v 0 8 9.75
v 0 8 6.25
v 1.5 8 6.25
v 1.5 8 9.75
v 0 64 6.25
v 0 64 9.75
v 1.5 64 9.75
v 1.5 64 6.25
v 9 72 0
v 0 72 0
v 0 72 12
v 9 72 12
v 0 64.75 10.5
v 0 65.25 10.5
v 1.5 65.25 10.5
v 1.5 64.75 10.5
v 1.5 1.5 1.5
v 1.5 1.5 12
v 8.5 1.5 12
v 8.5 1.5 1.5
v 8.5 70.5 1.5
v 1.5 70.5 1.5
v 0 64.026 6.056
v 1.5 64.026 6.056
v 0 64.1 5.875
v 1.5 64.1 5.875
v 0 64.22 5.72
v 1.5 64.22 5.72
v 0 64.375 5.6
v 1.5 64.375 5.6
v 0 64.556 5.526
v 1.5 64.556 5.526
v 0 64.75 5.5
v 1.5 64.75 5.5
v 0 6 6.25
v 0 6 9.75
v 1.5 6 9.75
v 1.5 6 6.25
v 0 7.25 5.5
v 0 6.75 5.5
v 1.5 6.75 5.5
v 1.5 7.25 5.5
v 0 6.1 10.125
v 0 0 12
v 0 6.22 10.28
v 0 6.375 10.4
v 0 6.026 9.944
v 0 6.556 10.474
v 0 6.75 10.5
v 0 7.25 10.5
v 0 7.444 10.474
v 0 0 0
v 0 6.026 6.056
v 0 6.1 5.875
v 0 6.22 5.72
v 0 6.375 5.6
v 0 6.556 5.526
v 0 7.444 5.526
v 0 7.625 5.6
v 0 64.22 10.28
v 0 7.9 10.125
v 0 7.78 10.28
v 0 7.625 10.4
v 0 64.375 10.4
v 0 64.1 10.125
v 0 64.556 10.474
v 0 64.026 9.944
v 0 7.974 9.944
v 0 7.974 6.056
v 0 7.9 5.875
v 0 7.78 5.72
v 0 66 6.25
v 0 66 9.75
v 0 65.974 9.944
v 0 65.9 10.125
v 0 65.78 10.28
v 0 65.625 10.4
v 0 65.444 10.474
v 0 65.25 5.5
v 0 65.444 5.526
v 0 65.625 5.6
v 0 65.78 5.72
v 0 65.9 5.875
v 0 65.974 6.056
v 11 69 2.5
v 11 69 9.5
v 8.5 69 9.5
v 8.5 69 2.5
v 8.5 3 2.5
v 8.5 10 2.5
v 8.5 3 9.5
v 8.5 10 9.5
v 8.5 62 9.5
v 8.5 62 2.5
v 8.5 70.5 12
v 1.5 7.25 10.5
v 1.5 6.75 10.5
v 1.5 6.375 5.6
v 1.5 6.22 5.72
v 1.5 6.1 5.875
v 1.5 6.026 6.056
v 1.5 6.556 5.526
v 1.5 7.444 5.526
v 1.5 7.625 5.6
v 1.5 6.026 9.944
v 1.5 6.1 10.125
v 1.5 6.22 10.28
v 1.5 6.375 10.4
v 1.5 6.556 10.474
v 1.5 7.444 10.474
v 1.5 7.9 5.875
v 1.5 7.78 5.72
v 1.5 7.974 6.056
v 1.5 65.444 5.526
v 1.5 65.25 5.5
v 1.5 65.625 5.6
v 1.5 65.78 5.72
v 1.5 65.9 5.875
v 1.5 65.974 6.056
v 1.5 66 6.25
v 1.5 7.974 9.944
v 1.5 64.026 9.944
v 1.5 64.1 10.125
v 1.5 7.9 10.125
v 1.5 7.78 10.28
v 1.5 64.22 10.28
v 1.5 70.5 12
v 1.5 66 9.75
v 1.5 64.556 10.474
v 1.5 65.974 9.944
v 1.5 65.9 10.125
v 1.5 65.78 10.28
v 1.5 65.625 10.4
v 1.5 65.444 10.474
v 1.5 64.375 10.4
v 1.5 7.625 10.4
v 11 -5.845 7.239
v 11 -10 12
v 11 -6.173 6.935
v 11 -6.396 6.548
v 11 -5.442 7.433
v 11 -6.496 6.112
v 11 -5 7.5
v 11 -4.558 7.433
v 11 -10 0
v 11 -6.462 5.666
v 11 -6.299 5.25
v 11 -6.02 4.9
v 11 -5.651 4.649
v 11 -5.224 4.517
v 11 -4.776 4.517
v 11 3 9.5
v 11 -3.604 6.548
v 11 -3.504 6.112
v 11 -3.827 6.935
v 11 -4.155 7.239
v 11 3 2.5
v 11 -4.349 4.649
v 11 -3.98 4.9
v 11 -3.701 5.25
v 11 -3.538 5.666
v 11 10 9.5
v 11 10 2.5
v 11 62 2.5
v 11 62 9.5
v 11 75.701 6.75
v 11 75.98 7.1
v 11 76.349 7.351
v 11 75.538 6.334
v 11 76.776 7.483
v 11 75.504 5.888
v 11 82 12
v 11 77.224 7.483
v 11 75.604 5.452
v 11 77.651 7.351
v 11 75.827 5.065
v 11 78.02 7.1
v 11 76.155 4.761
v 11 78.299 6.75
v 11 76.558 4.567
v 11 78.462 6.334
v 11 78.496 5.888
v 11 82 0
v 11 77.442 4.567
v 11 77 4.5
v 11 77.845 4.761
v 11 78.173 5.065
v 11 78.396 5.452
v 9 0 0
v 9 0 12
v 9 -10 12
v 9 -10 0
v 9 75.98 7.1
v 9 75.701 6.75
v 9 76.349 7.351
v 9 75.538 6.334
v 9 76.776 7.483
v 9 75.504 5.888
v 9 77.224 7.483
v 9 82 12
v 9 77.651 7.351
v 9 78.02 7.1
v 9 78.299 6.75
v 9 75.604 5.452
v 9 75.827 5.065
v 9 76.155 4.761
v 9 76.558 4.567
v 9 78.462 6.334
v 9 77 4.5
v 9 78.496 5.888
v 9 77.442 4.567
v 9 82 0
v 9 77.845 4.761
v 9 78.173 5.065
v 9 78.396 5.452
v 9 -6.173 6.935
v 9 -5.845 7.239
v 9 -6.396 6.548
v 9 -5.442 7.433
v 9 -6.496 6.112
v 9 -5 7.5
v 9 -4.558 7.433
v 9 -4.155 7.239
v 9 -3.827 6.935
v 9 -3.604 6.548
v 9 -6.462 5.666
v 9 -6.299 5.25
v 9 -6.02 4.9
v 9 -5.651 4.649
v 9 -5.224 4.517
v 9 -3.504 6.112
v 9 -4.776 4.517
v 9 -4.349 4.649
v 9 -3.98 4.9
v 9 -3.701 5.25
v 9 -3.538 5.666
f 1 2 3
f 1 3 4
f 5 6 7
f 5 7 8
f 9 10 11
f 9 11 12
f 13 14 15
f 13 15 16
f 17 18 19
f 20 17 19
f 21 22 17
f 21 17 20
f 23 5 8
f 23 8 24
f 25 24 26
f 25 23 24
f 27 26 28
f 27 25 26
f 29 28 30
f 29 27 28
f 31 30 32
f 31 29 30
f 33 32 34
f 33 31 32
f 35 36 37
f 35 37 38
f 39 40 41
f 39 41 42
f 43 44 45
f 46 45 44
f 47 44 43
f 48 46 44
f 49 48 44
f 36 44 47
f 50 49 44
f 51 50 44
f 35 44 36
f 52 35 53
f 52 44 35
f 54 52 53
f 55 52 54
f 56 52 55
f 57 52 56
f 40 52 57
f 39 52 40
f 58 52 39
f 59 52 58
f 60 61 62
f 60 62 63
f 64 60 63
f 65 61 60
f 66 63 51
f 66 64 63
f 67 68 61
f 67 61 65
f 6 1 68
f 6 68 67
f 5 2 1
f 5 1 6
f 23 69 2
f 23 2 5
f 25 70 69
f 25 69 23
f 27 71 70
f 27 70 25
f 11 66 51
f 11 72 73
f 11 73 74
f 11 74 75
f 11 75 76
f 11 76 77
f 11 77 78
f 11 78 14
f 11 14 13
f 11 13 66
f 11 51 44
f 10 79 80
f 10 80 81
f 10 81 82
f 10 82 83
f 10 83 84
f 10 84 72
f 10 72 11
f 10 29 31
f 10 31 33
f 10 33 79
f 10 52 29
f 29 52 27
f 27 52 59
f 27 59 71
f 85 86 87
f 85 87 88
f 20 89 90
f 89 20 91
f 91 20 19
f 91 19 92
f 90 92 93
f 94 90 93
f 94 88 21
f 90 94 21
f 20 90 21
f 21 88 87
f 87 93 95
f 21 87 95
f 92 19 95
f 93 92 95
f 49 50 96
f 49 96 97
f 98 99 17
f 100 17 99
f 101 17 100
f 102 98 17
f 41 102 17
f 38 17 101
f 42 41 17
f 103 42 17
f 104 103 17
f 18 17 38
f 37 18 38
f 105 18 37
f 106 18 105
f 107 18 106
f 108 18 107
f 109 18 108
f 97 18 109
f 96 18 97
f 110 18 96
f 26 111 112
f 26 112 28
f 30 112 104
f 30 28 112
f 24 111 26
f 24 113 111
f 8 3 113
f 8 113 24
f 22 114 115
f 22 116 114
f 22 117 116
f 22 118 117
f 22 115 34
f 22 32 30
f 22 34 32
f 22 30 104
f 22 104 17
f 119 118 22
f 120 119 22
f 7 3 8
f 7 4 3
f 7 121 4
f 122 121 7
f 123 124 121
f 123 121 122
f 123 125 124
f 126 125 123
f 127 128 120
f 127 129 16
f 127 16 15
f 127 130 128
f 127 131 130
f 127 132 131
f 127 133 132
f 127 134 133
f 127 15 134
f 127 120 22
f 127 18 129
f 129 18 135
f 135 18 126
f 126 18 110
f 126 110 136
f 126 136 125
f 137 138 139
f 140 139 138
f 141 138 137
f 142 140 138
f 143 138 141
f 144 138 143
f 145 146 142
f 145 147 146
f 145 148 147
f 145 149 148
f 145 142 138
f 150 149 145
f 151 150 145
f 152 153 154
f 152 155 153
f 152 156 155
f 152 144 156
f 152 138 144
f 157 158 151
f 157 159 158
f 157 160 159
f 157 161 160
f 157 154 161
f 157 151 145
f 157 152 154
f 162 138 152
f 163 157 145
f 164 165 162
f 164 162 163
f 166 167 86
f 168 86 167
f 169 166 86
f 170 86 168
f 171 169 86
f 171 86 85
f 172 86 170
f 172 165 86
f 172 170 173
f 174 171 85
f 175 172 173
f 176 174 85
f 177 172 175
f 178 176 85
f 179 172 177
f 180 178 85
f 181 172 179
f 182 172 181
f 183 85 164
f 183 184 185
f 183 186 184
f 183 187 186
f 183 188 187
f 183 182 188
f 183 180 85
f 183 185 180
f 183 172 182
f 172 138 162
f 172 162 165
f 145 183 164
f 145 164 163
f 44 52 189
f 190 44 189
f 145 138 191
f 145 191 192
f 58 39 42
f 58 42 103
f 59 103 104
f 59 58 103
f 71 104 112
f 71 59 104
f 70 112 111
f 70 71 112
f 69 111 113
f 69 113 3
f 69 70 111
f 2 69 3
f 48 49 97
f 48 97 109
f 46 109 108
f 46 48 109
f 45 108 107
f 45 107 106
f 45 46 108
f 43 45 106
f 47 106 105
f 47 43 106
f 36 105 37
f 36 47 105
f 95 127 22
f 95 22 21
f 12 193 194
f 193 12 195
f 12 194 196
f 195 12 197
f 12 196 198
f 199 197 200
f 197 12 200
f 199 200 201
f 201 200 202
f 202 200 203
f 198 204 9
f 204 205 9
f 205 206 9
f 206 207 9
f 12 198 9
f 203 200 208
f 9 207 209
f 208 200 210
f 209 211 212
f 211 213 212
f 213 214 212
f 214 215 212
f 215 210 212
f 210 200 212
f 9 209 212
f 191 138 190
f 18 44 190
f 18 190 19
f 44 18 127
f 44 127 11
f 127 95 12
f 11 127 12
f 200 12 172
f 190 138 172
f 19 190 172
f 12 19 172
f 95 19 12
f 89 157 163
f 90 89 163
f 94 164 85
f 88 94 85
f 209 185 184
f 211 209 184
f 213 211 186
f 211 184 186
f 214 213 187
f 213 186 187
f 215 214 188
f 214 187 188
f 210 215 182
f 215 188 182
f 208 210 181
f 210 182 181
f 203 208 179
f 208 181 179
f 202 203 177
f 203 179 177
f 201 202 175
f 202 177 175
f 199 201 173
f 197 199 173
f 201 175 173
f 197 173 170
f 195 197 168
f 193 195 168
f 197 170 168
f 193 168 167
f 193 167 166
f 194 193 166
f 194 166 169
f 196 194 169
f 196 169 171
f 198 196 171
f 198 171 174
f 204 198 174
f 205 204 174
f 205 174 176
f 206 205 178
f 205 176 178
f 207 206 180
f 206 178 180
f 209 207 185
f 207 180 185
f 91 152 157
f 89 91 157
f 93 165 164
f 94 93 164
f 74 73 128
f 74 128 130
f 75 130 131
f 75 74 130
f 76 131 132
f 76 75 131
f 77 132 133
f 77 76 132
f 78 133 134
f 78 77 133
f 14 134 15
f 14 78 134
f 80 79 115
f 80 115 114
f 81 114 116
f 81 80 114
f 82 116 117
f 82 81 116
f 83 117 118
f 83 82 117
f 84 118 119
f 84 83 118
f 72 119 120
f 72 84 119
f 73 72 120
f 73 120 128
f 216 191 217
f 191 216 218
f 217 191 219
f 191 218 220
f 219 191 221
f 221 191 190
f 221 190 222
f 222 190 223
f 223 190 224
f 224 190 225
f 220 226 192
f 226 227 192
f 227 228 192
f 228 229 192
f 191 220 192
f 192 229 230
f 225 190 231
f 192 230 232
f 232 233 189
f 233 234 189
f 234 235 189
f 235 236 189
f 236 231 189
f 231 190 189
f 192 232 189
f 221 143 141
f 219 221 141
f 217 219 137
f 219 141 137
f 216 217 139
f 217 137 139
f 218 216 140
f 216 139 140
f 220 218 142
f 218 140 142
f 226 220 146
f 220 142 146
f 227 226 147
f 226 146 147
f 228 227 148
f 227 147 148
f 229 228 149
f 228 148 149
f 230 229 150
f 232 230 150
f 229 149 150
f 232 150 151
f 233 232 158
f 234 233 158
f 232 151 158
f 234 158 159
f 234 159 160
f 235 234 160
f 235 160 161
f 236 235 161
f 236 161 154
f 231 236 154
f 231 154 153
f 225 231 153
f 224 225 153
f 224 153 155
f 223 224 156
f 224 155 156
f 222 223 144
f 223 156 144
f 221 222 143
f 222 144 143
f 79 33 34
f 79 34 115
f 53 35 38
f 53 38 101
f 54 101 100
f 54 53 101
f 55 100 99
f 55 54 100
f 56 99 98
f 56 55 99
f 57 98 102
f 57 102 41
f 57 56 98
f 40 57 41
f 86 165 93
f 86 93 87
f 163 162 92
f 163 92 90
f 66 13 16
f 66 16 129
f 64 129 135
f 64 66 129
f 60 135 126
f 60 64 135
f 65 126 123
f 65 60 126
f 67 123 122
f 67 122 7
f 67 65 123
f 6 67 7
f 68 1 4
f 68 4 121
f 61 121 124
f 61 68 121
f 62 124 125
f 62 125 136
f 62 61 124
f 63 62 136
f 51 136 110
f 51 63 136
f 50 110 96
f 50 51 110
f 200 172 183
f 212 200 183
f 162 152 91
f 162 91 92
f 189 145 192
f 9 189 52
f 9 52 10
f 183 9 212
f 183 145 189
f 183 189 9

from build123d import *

# Parameters (mm, degrees)
SKETCH1_W           = 11
SKETCH1_H           = 72
BOSS_EXTRUDE1_DEPTH = 12
SKETCH2_W           = 12
SKETCH2_H           = 10
SKETCH2_R           = 1.5
BOSS_EXTRUDE2_DEPTH = 2
SKETCH3_W           = 7
SKETCH3_H           = 7
CUT_EXTRUDE1_DEPTH  = 3
SKETCH4_W           = 7
SKETCH4_H           = 69
CUT_EXTRUDE2_DEPTH  = 10.5
CUT_EXTRUDE3_DEPTH  = 1.5


with BuildPart() as part:
    # Sketch1 → Boss-Extrude1 (new body)
    with BuildSketch(Plane.XY):
        with Locations((5.5, 36)):
            Rectangle(SKETCH1_W, SKETCH1_H)
    extrude(amount=BOSS_EXTRUDE1_DEPTH)

    # Sketch2 → Boss-Extrude2 (add)
    # profile 1 of 2: a face of its own
    with BuildSketch(Plane(origin=(11, 0, 0), x_dir=(0, 0, -1), z_dir=(1, 0, 0))):
        with Locations((-6, 77)):
            Rectangle(SKETCH2_W, SKETCH2_H)
        with Locations((-6, 77)):
            Circle(SKETCH2_R, mode=Mode.SUBTRACT)
    # profile 2 of 2: a face of its own
    with BuildSketch(Plane(origin=(11, 0, 0), x_dir=(0, 0, -1), z_dir=(1, 0, 0))):
        with Locations((-6, -5)):
            Rectangle(SKETCH2_W, SKETCH2_H)
        with Locations(Location((-6, -5, 0), (0, 0, 180))):
            Circle(SKETCH2_R, mode=Mode.SUBTRACT)
    extrude(amount=-BOSS_EXTRUDE2_DEPTH)

    # Sketch3 → Cut-Extrude1 (cut)
    with BuildSketch(Plane(origin=(11, 0, 0), x_dir=(0, 0, -1), z_dir=(1, 0, 0))):
        with Locations((-6, 65.5)):
            Rectangle(SKETCH3_W, SKETCH3_H)
        with Locations((-6, 6.5)):
            Rectangle(SKETCH3_W, SKETCH3_H)
    extrude(amount=-CUT_EXTRUDE1_DEPTH, mode=Mode.SUBTRACT)

    # Sketch4 → Cut-Extrude2 (cut)
    with BuildSketch(Plane.XY.offset(12)):
        with Locations((5, 36)):
            Rectangle(SKETCH4_W, SKETCH4_H)
    extrude(amount=-CUT_EXTRUDE2_DEPTH, mode=Mode.SUBTRACT)

    # Sketch5 → Cut-Extrude3 (cut)
    with BuildSketch(Plane.ZY):
        with BuildLine():
            Line((6.25, 66), (9.75, 66))
            ThreePointArc((9.75, 66), (10.280330086, 65.780330086), (10.5, 65.25))
            Line((10.5, 65.25), (10.5, 64.75))
            ThreePointArc((10.5, 64.75), (10.280330086, 64.219669914), (9.75, 64))
            Line((9.75, 64), (6.25, 64))
            ThreePointArc((6.25, 64), (5.719669914, 64.219669914), (5.5, 64.75))
            Line((5.5, 64.75), (5.5, 65.25))
            ThreePointArc((5.5, 65.25), (5.719669914, 65.780330086), (6.25, 66))
        make_face()
        with BuildLine():
            Line((6.25, 8), (9.75, 8))
            ThreePointArc((9.75, 8), (10.280330086, 7.780330086), (10.5, 7.25))
            Line((10.5, 7.25), (10.5, 6.75))
            ThreePointArc((10.5, 6.75), (10.280330086, 6.219669914), (9.75, 6))
            Line((9.75, 6), (6.25, 6))
            ThreePointArc((6.25, 6), (5.719669914, 6.219669914), (5.5, 6.75))
            Line((5.5, 6.75), (5.5, 7.25))
            ThreePointArc((5.5, 7.25), (5.719669914, 7.780330086), (6.25, 8))
        make_face()
    extrude(amount=-CUT_EXTRUDE3_DEPTH, mode=Mode.SUBTRACT)


solid = part.part
